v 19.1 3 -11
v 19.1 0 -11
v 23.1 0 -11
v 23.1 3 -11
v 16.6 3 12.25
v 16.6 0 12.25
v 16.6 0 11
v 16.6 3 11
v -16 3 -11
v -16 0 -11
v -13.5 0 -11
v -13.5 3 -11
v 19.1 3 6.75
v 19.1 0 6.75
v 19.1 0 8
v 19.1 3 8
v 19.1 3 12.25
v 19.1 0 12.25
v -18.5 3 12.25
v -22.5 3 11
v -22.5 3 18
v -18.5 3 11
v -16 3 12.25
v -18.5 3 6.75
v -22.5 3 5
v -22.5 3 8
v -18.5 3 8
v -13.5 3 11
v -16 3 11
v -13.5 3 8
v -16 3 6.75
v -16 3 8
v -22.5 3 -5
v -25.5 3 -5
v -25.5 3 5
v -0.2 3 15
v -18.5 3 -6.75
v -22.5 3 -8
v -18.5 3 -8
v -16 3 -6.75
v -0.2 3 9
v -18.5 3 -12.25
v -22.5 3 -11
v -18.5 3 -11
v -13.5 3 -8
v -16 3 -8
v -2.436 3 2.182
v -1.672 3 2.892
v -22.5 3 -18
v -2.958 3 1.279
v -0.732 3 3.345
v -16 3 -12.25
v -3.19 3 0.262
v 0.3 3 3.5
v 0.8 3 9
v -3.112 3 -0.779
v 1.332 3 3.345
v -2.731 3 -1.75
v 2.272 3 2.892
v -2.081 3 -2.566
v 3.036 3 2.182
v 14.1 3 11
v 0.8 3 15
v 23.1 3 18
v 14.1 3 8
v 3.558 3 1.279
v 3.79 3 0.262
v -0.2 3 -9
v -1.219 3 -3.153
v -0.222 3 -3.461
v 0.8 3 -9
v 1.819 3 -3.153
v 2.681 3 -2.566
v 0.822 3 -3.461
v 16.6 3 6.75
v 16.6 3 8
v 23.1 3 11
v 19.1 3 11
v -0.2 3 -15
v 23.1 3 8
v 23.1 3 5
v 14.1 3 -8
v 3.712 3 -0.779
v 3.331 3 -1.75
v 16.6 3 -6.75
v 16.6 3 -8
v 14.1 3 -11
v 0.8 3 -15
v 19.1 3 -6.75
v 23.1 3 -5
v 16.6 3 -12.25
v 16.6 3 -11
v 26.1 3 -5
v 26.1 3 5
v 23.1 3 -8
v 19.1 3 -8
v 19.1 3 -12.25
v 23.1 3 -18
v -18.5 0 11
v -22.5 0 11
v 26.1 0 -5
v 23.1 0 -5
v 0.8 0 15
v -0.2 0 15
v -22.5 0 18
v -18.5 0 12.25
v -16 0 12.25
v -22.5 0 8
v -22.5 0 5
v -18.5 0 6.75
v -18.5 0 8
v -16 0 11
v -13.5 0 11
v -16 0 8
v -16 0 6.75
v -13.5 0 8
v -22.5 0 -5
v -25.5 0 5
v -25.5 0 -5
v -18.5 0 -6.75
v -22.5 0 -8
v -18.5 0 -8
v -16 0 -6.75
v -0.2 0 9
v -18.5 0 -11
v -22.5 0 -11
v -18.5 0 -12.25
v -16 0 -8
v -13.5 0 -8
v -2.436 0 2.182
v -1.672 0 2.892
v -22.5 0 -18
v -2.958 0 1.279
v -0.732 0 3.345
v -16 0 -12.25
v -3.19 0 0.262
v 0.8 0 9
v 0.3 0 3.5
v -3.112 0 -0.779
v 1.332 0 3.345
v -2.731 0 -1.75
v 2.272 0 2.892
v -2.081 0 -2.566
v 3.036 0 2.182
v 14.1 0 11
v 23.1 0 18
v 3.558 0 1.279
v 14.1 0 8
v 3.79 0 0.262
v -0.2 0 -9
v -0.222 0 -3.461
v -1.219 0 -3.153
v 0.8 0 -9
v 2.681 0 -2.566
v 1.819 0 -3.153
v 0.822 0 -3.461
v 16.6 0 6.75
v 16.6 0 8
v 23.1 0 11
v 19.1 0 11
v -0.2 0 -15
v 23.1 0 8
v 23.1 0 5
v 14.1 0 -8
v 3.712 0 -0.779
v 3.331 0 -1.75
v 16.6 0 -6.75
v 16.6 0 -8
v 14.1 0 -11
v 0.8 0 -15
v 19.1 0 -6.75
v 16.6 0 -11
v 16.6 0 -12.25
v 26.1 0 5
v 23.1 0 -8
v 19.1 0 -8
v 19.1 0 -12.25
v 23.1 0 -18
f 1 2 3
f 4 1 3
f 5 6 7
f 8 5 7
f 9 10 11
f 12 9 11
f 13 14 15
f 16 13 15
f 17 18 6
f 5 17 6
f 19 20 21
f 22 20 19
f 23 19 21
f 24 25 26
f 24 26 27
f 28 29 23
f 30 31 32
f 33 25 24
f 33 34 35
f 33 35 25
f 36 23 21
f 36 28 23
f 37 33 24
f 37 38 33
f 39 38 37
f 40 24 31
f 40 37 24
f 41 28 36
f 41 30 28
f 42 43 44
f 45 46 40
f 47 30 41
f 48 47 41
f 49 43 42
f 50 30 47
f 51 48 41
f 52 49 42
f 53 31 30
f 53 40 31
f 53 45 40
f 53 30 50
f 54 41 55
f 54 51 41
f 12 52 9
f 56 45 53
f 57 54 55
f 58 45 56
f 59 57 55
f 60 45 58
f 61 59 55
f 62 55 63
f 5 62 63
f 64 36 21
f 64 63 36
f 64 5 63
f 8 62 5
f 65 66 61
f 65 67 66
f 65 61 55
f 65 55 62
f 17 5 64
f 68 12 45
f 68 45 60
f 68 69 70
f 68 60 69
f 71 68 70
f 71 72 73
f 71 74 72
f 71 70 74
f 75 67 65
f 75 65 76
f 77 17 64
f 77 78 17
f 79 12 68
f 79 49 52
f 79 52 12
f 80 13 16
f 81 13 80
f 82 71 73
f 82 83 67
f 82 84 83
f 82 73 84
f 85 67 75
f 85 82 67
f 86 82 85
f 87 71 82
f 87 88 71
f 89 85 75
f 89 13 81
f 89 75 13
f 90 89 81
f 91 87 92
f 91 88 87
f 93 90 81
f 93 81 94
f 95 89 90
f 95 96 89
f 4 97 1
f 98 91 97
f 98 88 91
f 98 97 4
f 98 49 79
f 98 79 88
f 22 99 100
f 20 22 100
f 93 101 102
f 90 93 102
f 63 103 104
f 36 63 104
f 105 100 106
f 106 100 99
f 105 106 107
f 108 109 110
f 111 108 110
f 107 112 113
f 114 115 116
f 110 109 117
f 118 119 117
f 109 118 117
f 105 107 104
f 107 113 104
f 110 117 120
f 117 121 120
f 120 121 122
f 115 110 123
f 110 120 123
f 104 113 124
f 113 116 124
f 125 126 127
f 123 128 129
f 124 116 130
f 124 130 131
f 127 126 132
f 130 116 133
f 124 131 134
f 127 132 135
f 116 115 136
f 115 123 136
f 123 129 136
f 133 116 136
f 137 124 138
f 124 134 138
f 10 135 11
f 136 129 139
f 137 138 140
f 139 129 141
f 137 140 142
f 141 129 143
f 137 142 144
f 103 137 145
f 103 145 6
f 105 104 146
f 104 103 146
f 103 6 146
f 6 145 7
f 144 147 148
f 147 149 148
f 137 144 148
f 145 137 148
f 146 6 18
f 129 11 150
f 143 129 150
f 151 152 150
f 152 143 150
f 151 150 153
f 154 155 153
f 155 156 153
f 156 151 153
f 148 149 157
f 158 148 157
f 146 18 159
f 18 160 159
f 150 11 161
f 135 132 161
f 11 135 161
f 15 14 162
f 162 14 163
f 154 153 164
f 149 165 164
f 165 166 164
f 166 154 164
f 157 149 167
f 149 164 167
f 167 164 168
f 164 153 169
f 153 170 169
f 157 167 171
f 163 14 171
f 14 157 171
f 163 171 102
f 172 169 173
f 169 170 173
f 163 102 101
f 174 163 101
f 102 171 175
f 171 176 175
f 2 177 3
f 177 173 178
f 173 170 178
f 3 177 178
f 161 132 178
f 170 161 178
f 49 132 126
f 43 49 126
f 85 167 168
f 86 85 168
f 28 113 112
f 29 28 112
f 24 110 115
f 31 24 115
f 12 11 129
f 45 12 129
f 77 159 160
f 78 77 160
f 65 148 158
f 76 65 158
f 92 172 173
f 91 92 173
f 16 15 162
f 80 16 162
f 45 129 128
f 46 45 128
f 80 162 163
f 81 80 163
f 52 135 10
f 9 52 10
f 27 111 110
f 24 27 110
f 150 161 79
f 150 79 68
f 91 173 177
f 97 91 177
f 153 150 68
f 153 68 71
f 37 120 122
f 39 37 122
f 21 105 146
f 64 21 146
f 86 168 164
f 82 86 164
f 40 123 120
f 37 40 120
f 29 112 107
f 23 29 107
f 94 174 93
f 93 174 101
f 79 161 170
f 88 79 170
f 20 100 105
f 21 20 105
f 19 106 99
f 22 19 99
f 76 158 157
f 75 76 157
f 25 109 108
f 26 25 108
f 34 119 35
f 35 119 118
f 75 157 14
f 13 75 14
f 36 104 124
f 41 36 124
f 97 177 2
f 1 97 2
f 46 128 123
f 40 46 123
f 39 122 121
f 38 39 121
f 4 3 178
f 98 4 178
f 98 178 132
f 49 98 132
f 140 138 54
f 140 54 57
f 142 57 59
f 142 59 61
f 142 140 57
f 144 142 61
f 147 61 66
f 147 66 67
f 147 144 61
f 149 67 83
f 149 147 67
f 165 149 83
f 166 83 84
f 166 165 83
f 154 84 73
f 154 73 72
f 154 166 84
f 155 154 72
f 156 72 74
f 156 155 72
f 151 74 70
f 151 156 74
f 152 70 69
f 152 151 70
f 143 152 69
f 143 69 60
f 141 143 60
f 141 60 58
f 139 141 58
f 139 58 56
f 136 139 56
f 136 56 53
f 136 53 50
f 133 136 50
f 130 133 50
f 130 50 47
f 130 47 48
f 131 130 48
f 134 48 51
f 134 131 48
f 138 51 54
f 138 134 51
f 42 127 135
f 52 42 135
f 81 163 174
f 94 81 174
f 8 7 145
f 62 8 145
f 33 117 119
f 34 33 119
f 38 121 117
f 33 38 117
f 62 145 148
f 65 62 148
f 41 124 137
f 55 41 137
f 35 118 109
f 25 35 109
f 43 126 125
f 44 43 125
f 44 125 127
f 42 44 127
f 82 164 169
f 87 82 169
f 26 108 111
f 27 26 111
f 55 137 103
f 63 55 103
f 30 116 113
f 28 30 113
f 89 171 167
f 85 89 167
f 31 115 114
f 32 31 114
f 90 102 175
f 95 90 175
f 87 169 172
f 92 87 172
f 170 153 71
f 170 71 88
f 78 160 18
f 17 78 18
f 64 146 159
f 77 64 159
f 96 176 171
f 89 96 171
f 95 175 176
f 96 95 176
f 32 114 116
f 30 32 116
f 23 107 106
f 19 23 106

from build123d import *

# Parameters (mm, degrees)
ESBO_O4_R                = 3.5
RESSALTO_EXTRUS_O1_DEPTH = 3


with BuildPart() as part:
    # Esboço4 → Ressalto-extrusão1 (new body)
    with BuildSketch(Plane(origin=(0, 0, 0), x_dir=(1, 0, 0), z_dir=(0, 1, 0))):
        Polygon((19.1, 6.75), (16.6, 6.75), (16.6, 8), (14.1, 8), (14.1, 11), (16.6, 11), (16.6, 12.25), (19.1, 12.25), (19.1, 11), (23.1, 11), (23.1, 18), (-0.5, 18), (-22.5, 18), (-22.5, 11), (-18.5, 11), (-18.5, 12.25), (-16, 12.25), (-16, 11), (-13.5, 11), (-13.5, 8), (-16, 8), (-16, 6.75), (-18.5, 6.75), (-18.5, 8), (-22.5, 8), (-22.5, 5), (-25.5, 5), (-25.5, -5), (-22.5, -5), (-22.5, -8), (-18.5, -8), (-18.5, -6.75), (-16, -6.75), (-16, -8), (-13.5, -8), (-13.5, -11), (-16, -11), (-16, -12.25), (-18.5, -12.25), (-18.5, -11), (-22.5, -11), (-22.5, -18), (-0.5, -18), (23.1, -18), (23.1, -11), (19.1, -11), (19.1, -12.25), (16.6, -12.25), (16.6, -11), (14.1, -11), (14.1, -8), (16.6, -8), (16.6, -6.75), (19.1, -6.75), (19.1, -8), (23.1, -8), (23.1, -5), (26.1, -5), (26.1, 5), (23.1, 5), (23.1, 8), (19.1, 8), align=None)
        with Locations(Location((0.3, 0, 0), (0, 0, 270))):
            Circle(ESBO_O4_R, mode=Mode.SUBTRACT)
        Polygon((0.3, -15), (-0.2, -15), (-0.2, -9), (0.8, -9), (0.8, -15), align=None, mode=Mode.SUBTRACT)
        Polygon((0.8, 15), (0.3, 15), (-0.2, 15), (-0.2, 9), (0.8, 9), align=None, mode=Mode.SUBTRACT)
    extrude(amount=RESSALTO_EXTRUS_O1_DEPTH)


solid = part.part
